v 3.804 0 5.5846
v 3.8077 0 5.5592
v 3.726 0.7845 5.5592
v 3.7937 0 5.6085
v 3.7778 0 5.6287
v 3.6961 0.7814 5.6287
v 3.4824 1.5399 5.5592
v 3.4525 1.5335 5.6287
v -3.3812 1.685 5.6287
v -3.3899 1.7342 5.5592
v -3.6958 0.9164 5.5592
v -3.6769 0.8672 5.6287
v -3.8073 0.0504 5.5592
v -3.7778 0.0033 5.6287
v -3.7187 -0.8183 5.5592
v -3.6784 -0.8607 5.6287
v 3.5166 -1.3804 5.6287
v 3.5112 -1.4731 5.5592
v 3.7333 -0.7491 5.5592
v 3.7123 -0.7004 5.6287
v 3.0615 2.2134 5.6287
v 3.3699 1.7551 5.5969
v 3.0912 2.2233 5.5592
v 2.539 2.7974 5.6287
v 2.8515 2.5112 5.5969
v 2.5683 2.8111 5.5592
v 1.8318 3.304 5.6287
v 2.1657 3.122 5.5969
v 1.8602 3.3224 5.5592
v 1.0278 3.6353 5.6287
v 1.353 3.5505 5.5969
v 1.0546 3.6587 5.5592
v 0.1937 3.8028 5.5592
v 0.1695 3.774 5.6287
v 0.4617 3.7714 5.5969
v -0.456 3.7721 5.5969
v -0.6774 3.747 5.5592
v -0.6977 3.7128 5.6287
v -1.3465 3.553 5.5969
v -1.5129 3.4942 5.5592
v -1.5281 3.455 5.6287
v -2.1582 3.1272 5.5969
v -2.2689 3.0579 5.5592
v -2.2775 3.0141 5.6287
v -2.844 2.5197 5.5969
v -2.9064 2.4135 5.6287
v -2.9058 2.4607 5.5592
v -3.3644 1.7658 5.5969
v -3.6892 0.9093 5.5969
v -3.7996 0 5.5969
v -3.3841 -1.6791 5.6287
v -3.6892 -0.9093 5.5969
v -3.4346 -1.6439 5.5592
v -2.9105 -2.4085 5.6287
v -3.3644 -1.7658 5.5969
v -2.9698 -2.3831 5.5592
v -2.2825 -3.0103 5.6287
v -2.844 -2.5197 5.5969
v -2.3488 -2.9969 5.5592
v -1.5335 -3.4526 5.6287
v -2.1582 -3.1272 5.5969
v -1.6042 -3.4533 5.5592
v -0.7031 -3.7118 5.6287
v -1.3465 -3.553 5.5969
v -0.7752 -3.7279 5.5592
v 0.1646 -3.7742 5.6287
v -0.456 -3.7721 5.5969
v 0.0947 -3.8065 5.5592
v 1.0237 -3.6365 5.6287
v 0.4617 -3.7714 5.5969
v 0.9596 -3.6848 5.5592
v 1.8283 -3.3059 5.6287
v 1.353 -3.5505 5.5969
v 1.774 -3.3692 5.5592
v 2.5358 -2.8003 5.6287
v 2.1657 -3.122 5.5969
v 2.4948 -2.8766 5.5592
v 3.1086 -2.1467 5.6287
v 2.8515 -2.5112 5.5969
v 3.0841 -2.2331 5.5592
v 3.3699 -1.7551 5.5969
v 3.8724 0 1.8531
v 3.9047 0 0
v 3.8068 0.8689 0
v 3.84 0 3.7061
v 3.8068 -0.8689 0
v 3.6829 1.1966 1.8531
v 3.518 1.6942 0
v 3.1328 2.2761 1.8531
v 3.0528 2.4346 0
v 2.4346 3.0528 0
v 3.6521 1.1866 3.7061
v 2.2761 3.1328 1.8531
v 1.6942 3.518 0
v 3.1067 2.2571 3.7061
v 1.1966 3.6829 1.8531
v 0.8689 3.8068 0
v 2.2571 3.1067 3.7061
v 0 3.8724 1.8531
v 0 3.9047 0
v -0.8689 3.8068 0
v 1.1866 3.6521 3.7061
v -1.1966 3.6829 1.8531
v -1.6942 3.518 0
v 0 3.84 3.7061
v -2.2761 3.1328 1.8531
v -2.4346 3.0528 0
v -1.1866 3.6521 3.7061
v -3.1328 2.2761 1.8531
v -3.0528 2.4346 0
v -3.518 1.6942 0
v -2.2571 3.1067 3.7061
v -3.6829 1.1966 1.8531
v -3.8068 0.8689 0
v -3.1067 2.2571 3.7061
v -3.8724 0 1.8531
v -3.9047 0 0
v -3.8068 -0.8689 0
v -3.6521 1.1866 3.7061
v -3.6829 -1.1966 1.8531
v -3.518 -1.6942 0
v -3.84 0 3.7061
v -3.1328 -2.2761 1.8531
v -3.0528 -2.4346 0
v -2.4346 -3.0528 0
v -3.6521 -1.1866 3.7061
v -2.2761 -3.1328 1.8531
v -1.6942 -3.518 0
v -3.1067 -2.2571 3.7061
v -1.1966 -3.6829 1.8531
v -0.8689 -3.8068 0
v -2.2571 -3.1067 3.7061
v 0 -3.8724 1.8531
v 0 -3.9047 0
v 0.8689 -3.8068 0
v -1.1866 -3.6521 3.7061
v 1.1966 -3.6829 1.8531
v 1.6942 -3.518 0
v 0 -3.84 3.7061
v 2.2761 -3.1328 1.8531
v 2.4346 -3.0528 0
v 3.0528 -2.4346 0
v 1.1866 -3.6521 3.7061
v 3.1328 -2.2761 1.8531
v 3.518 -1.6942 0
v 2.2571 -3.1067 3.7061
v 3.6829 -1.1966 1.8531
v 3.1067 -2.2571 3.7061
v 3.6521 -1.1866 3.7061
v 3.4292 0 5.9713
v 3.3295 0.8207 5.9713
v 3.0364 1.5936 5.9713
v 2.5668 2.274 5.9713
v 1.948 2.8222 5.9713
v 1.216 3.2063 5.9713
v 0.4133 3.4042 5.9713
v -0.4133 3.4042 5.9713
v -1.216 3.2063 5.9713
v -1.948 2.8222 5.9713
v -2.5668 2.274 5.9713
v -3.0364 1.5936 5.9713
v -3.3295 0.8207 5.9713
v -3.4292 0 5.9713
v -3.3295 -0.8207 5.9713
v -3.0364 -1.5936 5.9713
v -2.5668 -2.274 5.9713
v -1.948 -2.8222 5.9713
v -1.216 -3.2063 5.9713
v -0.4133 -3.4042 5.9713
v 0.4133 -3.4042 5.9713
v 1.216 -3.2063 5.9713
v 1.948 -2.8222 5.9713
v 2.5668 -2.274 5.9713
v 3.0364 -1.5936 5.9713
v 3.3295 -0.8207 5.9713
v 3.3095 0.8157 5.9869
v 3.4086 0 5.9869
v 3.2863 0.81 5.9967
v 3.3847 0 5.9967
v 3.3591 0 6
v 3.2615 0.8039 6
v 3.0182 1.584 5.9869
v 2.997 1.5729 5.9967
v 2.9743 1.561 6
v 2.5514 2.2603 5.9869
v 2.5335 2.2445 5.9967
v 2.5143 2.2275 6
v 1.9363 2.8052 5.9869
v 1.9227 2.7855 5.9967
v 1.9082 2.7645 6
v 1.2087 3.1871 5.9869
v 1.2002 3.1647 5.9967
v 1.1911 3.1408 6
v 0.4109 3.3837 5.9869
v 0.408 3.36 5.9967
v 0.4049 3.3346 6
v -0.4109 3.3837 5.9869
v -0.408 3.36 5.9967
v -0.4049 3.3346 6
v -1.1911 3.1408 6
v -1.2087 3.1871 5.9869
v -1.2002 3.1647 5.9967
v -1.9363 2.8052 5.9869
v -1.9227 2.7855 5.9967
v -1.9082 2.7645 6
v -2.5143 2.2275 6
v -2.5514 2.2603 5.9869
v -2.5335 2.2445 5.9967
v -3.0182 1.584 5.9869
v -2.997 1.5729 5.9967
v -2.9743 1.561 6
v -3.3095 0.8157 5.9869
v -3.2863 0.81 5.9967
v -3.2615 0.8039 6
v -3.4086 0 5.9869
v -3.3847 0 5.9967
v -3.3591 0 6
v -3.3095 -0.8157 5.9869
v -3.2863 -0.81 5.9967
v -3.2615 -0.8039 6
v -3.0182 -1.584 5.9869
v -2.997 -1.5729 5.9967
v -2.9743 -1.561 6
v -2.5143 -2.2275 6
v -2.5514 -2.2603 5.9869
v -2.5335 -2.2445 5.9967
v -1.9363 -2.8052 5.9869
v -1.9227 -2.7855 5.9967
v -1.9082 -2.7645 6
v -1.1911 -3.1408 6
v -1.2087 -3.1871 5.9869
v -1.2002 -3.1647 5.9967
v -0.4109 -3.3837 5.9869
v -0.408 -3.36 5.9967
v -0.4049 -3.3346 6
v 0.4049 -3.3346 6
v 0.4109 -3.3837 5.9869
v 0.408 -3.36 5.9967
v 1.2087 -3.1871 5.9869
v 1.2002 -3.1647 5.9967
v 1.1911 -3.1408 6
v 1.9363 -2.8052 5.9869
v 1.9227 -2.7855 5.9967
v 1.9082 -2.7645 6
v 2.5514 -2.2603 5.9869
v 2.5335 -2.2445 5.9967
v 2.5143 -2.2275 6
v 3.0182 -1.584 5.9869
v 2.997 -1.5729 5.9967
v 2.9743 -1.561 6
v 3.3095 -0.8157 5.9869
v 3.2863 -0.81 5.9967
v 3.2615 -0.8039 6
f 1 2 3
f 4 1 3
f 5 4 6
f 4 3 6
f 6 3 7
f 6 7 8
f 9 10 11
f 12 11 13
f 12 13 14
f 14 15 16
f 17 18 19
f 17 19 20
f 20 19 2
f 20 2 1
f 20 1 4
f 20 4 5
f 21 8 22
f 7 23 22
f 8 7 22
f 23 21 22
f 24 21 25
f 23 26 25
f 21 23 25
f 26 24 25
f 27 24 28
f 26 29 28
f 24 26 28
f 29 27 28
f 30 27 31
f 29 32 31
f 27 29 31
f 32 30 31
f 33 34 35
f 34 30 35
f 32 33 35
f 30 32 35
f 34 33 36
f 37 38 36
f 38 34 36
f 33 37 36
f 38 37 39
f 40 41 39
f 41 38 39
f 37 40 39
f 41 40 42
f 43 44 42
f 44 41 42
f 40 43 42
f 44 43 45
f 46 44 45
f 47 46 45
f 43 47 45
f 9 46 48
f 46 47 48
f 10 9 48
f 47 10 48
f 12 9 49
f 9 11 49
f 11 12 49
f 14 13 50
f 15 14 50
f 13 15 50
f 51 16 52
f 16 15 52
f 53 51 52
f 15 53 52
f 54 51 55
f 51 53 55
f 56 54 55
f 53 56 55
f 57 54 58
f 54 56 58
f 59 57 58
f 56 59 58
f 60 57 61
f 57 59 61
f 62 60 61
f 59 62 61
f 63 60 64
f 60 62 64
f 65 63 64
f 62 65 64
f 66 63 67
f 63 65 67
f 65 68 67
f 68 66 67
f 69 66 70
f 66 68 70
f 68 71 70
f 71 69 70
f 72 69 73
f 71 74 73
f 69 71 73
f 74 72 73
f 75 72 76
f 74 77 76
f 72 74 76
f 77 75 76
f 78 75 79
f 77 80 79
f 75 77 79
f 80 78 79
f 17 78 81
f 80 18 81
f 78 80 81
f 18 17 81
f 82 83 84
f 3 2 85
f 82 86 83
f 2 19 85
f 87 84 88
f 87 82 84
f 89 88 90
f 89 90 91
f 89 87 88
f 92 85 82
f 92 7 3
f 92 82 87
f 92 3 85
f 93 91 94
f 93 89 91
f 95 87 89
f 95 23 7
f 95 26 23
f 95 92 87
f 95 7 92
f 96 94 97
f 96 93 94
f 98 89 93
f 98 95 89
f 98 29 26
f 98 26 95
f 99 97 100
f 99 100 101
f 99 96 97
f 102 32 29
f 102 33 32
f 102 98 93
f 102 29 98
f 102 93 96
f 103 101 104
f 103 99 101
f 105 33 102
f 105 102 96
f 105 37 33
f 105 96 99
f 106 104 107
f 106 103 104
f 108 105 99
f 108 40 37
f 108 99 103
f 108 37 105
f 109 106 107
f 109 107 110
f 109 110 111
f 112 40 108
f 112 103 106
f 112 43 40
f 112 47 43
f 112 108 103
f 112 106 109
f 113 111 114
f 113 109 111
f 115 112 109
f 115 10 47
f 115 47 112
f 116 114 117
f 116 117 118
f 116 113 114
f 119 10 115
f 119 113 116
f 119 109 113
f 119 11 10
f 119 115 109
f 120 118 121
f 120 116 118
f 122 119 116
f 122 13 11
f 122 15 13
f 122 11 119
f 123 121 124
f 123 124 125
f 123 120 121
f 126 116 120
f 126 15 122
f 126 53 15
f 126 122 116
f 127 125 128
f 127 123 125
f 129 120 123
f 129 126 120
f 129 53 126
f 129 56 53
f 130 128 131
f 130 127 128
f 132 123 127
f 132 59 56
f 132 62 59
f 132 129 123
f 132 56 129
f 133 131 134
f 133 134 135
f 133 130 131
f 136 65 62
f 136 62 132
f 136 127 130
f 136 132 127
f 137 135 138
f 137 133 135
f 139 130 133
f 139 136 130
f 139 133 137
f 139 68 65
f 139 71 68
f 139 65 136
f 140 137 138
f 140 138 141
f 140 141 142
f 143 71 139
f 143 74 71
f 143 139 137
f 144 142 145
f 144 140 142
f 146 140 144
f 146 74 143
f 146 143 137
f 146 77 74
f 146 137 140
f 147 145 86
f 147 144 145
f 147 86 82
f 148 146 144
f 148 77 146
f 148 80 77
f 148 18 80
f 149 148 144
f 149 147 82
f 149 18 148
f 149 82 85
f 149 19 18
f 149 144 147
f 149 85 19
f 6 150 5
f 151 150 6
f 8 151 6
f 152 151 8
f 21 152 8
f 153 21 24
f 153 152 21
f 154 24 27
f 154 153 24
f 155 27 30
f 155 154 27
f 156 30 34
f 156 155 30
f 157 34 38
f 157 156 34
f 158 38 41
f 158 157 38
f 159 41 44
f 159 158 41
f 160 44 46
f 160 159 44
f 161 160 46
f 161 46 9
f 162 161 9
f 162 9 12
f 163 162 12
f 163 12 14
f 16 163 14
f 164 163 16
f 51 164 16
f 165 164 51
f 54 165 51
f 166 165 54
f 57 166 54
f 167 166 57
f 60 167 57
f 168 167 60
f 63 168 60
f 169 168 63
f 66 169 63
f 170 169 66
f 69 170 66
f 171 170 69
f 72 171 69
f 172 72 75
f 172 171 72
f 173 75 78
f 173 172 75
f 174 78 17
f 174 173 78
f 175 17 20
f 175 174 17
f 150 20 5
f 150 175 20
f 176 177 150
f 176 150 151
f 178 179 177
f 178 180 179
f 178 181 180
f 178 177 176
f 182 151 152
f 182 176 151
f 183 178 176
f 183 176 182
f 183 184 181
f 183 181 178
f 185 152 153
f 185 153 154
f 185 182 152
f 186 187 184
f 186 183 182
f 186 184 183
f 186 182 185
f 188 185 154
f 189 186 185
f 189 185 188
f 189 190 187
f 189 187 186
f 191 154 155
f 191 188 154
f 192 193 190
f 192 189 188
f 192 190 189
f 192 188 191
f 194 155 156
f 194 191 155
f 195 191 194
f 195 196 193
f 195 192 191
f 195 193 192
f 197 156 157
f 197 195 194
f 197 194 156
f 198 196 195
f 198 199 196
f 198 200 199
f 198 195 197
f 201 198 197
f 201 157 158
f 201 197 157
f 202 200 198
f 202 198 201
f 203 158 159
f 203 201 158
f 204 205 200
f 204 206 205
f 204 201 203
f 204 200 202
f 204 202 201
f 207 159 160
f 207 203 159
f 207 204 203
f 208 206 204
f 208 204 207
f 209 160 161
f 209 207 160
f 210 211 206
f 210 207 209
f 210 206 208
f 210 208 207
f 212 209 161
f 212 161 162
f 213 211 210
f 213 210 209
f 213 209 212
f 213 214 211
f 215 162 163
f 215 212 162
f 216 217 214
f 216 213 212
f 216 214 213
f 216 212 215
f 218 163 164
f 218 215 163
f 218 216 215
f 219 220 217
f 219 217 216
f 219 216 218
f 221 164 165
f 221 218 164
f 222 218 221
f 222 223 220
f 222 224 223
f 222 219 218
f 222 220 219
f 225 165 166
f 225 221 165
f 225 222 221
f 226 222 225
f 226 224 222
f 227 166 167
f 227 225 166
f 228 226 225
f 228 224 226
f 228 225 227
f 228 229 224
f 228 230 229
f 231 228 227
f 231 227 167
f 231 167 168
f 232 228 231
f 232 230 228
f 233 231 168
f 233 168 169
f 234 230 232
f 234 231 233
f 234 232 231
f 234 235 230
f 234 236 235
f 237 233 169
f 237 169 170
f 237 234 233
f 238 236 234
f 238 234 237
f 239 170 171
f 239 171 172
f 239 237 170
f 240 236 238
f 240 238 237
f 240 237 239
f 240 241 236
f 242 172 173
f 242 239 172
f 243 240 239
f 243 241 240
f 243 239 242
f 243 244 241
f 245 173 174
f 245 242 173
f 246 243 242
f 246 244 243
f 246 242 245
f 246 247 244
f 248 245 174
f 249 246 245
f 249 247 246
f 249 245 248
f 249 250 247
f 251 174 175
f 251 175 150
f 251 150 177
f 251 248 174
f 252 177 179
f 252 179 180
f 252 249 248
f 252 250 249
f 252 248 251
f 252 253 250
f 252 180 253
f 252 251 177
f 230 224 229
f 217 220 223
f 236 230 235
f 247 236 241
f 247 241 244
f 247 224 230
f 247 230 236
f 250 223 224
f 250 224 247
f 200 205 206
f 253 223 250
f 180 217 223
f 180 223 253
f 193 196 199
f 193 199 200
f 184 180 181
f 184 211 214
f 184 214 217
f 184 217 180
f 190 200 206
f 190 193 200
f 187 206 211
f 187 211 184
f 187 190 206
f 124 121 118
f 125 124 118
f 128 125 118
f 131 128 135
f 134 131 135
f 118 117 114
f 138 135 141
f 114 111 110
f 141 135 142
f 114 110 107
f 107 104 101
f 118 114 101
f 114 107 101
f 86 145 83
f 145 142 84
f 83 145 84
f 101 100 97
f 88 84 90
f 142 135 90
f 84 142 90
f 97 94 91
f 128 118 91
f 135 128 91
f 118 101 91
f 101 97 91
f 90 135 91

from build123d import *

# Parameters (mm, degrees)
F0_R     = 4
F1_DEPTH = 6
F3_SIZE  = 0.4
F4_R     = 0.1


# Not quite as in the source:
# - a fillet or chamfer that OpenCascade refuses, or shapes differently, is made with other operations: its cross-section is extruded or revolved along the edge and cut away or added


with BuildPart() as f1:
    # F0 (on Top) → F1 (new body)
    with BuildSketch(Plane.XY):
        Circle(F0_R)
    extrude(amount=F1_DEPTH)

    # F2: chamfer of 0.2 x 11.4579923262 on 1 edges, made by hand

    # F2_s1 → F2_t2 (revolve, cut)
    with BuildSketch(Plane.XZ):
        Polygon((4, -5.4579923262), (3.8, 6), (4, 6), align=None)
    revolve(axis=Axis((0, 0, 6), (0, 0, 1)), mode=Mode.SUBTRACT)

    # F3
    f3_edges = [f1.edges().sort_by_distance(p)[0] for p in [
        (-3.8, 0, 6),
    ]]
    chamfer(f3_edges, length=F3_SIZE)

    # F4
    f4_edges = [f1.edges().sort_by_distance(p)[0] for p in [
        (-3.4, 0, 6),
        (-3.806981, 0, 5.600061),
    ]]
    fillet(f4_edges, radius=F4_R)


solid = f1.part
